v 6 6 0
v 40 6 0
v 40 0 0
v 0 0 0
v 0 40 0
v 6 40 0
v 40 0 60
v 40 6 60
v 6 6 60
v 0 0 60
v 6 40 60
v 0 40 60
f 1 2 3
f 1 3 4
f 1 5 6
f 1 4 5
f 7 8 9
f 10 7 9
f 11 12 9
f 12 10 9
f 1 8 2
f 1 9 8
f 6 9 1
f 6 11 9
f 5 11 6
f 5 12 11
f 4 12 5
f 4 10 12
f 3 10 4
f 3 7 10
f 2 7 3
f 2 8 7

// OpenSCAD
$fn = 32;

// ----------------------------------------------------------------------
// Structural section: angle 40 x 40 mm
// ----------------------------------------------------------------------

// --- parameters (mm) ---
sec_w = 40;               // leg width, X
sec_h = 40;               // leg height, Y
flange_t = 6;             // leg thickness
plate_t = 60;             // cut length, Z (extrusion height)

profile = [[0, 0], [40, 0], [40, 6], [6, 6], [6, 40], [0, 40]];  // primary outline, 6 points, counter clockwise

// --- the one profile operation ---
linear_extrude(height = plate_t) polygon(points = profile);
